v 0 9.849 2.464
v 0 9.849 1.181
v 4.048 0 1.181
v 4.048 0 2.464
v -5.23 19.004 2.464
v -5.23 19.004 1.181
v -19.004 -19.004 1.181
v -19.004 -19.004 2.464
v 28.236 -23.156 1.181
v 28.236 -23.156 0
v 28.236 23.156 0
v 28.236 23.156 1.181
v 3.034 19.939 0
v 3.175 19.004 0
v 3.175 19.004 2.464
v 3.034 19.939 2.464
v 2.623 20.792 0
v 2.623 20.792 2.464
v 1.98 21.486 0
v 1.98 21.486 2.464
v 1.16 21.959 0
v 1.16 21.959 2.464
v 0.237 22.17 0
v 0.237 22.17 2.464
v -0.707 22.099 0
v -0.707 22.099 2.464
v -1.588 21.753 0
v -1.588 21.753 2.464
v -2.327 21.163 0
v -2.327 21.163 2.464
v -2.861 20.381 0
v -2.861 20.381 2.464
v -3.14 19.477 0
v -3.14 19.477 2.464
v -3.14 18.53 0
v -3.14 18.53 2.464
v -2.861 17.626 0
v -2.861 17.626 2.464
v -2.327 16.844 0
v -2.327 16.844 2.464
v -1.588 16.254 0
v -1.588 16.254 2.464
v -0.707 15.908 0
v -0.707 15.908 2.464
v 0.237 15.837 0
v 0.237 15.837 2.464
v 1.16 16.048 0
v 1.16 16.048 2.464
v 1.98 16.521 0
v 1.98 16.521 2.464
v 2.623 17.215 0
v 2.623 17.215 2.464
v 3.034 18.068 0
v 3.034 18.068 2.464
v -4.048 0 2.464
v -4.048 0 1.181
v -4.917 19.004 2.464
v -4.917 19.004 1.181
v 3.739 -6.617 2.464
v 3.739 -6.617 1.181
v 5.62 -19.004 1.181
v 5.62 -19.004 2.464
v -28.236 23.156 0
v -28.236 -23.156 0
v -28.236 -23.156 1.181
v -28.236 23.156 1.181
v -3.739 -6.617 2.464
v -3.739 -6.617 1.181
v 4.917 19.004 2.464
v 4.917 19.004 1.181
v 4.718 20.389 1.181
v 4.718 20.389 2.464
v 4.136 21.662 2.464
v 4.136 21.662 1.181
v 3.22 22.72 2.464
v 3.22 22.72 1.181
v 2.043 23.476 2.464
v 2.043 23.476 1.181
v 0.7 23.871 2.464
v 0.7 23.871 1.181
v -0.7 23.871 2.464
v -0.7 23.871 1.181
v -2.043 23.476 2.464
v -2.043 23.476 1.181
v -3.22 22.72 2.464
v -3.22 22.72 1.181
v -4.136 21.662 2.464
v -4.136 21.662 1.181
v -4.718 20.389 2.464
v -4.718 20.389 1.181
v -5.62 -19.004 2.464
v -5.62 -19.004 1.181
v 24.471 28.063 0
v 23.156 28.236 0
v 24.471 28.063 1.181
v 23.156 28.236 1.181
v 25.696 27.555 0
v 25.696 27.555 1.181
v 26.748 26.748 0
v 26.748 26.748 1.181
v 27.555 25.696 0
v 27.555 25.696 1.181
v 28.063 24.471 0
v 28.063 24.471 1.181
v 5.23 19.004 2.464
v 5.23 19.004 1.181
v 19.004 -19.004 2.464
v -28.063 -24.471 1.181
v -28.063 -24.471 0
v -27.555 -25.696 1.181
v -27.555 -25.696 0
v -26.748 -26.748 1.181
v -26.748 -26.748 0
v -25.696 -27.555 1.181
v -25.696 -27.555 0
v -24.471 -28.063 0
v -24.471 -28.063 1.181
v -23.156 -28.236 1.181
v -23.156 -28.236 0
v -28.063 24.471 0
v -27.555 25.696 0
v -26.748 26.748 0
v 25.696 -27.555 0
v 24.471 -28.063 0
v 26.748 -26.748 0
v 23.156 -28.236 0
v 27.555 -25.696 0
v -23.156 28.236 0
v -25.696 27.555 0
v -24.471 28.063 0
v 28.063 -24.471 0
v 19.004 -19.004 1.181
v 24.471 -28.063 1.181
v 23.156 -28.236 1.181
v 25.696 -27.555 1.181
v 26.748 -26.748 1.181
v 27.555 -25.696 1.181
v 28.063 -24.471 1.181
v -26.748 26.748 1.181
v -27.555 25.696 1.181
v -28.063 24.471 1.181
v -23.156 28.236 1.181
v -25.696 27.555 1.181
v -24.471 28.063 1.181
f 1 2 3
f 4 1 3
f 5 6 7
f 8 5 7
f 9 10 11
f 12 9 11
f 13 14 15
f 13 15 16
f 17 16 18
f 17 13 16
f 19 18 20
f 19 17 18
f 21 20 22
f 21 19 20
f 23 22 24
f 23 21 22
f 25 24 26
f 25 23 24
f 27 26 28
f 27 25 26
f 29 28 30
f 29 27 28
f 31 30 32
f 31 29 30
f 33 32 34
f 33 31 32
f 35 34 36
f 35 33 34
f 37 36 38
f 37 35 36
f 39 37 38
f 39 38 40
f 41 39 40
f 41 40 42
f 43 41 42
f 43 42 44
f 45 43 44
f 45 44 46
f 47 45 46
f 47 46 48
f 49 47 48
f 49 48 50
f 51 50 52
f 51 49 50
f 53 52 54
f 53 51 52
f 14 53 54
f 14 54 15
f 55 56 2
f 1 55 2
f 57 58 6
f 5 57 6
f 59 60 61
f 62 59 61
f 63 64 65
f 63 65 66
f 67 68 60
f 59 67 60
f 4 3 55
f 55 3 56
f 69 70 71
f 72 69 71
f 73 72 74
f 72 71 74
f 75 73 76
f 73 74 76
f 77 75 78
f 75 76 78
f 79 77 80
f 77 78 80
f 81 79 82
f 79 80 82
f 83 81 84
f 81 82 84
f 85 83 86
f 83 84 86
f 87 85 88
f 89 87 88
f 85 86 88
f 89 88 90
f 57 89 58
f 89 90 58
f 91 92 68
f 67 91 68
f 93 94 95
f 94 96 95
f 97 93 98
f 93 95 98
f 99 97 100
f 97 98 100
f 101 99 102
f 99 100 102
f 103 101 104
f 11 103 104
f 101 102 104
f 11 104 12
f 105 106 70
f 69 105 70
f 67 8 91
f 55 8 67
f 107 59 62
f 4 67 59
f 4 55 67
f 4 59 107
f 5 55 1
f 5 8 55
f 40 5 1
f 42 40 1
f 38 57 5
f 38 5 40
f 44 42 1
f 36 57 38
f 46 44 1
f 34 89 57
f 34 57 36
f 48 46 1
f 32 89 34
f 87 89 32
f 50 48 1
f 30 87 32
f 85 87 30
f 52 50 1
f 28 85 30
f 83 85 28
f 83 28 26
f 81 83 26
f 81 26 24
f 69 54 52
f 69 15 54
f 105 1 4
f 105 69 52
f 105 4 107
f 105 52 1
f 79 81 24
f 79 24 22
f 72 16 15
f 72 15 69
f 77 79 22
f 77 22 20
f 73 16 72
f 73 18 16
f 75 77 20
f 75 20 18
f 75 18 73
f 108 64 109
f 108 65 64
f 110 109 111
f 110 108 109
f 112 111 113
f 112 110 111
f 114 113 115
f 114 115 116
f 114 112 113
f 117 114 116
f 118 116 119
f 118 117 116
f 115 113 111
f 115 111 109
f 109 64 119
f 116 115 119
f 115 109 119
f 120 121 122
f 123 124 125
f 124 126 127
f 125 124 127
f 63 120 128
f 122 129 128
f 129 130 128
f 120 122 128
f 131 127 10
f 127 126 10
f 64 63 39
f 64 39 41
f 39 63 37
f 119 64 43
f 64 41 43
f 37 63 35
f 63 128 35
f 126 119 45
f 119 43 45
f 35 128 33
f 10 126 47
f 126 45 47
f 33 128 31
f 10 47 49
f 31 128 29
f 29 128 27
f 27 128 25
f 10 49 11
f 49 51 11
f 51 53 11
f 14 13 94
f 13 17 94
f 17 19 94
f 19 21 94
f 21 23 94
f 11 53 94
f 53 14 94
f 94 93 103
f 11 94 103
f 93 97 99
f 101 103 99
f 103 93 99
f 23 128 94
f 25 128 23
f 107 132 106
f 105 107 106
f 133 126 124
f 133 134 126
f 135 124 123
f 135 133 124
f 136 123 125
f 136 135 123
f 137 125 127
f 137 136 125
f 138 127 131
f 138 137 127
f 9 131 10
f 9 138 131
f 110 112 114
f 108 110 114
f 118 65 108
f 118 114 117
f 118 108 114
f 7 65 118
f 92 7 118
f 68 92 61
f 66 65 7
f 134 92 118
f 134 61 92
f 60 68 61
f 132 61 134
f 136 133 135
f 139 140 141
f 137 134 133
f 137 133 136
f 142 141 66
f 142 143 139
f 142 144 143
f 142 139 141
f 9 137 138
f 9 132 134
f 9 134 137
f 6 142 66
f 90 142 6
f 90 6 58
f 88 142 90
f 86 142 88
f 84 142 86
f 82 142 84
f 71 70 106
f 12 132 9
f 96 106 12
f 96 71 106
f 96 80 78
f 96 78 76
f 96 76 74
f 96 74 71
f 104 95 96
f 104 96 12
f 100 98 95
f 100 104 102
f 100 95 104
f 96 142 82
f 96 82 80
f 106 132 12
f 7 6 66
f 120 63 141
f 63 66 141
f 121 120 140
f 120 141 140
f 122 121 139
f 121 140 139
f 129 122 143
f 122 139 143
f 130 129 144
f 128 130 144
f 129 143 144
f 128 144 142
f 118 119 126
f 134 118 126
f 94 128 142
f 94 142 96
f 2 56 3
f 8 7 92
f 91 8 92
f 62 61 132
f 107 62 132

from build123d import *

# Parameters (mm, degrees)
F0_W     = 56.471486
F0_H     = 56.471486
F1_DEPTH = 1.1811
F0_R     = 3.175
F2_DEPTH = 2.4638
F3_R     = 5.08


with BuildPart() as f1:
    # F0 (on Top) → F1 (new body)
    with BuildSketch(Plane.XY):
        Rectangle(F0_W, F0_H)
        with BuildLine():
            Line((4.917035, 19.003581), (5.229957, 19.003581))
            Line((5.229957, 19.003581), (19.003581, -19.003581))
            Line((19.003581, -19.003581), (5.620397, -19.003581))
            Line((5.620397, -19.003581), (3.739397, -6.617126))
            Line((3.739397, -6.617126), (-3.739393, -6.617126))
            Line((-3.739393, -6.617126), (-5.620394, -19.003581))
            Line((-5.620394, -19.003581), (-19.003581, -19.003581))
            Line((-19.003581, -19.003581), (-5.229957, 19.003581))
            Line((-5.229957, 19.003581), (-4.917035, 19.003581))
            ThreePointArc((-4.917035, 19.003581), (0, 23.920617), (4.917035, 19.003581))
        make_face(mode=Mode.SUBTRACT)
        Polygon((0, 9.849461), (-4.047723, 0), (4.047723, 0), align=None)
    extrude(amount=F1_DEPTH)

    # F0 (on Top) → F2 (join)
    with BuildSketch(Plane.XY):
        with BuildLine():
            Line((19.003581, -19.003581), (5.229957, 19.003581))
            Line((5.229957, 19.003581), (4.917035, 19.003581))
            ThreePointArc((4.917035, 19.003581), (0, 23.920617), (-4.917035, 19.003581))
            Line((-4.917035, 19.003581), (-5.229957, 19.003581))
            Line((-5.229957, 19.003581), (-19.003581, -19.003581))
            Line((-19.003581, -19.003581), (-5.620394, -19.003581))
            Line((-5.620394, -19.003581), (-3.739393, -6.617126))
            Line((-3.739393, -6.617126), (3.739397, -6.617126))
            Line((3.739397, -6.617126), (5.620397, -19.003581))
            Line((5.620397, -19.003581), (19.003581, -19.003581))
        make_face()
        Polygon((4.047723, 0), (-4.047723, 0), (0, 9.849461), align=None, mode=Mode.SUBTRACT)
        with Locations((0, 19.003581)):
            Circle(F0_R, mode=Mode.SUBTRACT)
    extrude(amount=F2_DEPTH)

    # F3
    f3_edges = [f1.edges().sort_by_distance(p)[0] for p in [
        (28.235743, 28.235743, 0.59055),
        (-28.235743, 28.235743, 0.59055),
        (-28.235743, -28.235743, 0.59055),
        (28.235743, -28.235743, 0.59055),
    ]]
    fillet(f3_edges, radius=F3_R)


solid = f1.part
